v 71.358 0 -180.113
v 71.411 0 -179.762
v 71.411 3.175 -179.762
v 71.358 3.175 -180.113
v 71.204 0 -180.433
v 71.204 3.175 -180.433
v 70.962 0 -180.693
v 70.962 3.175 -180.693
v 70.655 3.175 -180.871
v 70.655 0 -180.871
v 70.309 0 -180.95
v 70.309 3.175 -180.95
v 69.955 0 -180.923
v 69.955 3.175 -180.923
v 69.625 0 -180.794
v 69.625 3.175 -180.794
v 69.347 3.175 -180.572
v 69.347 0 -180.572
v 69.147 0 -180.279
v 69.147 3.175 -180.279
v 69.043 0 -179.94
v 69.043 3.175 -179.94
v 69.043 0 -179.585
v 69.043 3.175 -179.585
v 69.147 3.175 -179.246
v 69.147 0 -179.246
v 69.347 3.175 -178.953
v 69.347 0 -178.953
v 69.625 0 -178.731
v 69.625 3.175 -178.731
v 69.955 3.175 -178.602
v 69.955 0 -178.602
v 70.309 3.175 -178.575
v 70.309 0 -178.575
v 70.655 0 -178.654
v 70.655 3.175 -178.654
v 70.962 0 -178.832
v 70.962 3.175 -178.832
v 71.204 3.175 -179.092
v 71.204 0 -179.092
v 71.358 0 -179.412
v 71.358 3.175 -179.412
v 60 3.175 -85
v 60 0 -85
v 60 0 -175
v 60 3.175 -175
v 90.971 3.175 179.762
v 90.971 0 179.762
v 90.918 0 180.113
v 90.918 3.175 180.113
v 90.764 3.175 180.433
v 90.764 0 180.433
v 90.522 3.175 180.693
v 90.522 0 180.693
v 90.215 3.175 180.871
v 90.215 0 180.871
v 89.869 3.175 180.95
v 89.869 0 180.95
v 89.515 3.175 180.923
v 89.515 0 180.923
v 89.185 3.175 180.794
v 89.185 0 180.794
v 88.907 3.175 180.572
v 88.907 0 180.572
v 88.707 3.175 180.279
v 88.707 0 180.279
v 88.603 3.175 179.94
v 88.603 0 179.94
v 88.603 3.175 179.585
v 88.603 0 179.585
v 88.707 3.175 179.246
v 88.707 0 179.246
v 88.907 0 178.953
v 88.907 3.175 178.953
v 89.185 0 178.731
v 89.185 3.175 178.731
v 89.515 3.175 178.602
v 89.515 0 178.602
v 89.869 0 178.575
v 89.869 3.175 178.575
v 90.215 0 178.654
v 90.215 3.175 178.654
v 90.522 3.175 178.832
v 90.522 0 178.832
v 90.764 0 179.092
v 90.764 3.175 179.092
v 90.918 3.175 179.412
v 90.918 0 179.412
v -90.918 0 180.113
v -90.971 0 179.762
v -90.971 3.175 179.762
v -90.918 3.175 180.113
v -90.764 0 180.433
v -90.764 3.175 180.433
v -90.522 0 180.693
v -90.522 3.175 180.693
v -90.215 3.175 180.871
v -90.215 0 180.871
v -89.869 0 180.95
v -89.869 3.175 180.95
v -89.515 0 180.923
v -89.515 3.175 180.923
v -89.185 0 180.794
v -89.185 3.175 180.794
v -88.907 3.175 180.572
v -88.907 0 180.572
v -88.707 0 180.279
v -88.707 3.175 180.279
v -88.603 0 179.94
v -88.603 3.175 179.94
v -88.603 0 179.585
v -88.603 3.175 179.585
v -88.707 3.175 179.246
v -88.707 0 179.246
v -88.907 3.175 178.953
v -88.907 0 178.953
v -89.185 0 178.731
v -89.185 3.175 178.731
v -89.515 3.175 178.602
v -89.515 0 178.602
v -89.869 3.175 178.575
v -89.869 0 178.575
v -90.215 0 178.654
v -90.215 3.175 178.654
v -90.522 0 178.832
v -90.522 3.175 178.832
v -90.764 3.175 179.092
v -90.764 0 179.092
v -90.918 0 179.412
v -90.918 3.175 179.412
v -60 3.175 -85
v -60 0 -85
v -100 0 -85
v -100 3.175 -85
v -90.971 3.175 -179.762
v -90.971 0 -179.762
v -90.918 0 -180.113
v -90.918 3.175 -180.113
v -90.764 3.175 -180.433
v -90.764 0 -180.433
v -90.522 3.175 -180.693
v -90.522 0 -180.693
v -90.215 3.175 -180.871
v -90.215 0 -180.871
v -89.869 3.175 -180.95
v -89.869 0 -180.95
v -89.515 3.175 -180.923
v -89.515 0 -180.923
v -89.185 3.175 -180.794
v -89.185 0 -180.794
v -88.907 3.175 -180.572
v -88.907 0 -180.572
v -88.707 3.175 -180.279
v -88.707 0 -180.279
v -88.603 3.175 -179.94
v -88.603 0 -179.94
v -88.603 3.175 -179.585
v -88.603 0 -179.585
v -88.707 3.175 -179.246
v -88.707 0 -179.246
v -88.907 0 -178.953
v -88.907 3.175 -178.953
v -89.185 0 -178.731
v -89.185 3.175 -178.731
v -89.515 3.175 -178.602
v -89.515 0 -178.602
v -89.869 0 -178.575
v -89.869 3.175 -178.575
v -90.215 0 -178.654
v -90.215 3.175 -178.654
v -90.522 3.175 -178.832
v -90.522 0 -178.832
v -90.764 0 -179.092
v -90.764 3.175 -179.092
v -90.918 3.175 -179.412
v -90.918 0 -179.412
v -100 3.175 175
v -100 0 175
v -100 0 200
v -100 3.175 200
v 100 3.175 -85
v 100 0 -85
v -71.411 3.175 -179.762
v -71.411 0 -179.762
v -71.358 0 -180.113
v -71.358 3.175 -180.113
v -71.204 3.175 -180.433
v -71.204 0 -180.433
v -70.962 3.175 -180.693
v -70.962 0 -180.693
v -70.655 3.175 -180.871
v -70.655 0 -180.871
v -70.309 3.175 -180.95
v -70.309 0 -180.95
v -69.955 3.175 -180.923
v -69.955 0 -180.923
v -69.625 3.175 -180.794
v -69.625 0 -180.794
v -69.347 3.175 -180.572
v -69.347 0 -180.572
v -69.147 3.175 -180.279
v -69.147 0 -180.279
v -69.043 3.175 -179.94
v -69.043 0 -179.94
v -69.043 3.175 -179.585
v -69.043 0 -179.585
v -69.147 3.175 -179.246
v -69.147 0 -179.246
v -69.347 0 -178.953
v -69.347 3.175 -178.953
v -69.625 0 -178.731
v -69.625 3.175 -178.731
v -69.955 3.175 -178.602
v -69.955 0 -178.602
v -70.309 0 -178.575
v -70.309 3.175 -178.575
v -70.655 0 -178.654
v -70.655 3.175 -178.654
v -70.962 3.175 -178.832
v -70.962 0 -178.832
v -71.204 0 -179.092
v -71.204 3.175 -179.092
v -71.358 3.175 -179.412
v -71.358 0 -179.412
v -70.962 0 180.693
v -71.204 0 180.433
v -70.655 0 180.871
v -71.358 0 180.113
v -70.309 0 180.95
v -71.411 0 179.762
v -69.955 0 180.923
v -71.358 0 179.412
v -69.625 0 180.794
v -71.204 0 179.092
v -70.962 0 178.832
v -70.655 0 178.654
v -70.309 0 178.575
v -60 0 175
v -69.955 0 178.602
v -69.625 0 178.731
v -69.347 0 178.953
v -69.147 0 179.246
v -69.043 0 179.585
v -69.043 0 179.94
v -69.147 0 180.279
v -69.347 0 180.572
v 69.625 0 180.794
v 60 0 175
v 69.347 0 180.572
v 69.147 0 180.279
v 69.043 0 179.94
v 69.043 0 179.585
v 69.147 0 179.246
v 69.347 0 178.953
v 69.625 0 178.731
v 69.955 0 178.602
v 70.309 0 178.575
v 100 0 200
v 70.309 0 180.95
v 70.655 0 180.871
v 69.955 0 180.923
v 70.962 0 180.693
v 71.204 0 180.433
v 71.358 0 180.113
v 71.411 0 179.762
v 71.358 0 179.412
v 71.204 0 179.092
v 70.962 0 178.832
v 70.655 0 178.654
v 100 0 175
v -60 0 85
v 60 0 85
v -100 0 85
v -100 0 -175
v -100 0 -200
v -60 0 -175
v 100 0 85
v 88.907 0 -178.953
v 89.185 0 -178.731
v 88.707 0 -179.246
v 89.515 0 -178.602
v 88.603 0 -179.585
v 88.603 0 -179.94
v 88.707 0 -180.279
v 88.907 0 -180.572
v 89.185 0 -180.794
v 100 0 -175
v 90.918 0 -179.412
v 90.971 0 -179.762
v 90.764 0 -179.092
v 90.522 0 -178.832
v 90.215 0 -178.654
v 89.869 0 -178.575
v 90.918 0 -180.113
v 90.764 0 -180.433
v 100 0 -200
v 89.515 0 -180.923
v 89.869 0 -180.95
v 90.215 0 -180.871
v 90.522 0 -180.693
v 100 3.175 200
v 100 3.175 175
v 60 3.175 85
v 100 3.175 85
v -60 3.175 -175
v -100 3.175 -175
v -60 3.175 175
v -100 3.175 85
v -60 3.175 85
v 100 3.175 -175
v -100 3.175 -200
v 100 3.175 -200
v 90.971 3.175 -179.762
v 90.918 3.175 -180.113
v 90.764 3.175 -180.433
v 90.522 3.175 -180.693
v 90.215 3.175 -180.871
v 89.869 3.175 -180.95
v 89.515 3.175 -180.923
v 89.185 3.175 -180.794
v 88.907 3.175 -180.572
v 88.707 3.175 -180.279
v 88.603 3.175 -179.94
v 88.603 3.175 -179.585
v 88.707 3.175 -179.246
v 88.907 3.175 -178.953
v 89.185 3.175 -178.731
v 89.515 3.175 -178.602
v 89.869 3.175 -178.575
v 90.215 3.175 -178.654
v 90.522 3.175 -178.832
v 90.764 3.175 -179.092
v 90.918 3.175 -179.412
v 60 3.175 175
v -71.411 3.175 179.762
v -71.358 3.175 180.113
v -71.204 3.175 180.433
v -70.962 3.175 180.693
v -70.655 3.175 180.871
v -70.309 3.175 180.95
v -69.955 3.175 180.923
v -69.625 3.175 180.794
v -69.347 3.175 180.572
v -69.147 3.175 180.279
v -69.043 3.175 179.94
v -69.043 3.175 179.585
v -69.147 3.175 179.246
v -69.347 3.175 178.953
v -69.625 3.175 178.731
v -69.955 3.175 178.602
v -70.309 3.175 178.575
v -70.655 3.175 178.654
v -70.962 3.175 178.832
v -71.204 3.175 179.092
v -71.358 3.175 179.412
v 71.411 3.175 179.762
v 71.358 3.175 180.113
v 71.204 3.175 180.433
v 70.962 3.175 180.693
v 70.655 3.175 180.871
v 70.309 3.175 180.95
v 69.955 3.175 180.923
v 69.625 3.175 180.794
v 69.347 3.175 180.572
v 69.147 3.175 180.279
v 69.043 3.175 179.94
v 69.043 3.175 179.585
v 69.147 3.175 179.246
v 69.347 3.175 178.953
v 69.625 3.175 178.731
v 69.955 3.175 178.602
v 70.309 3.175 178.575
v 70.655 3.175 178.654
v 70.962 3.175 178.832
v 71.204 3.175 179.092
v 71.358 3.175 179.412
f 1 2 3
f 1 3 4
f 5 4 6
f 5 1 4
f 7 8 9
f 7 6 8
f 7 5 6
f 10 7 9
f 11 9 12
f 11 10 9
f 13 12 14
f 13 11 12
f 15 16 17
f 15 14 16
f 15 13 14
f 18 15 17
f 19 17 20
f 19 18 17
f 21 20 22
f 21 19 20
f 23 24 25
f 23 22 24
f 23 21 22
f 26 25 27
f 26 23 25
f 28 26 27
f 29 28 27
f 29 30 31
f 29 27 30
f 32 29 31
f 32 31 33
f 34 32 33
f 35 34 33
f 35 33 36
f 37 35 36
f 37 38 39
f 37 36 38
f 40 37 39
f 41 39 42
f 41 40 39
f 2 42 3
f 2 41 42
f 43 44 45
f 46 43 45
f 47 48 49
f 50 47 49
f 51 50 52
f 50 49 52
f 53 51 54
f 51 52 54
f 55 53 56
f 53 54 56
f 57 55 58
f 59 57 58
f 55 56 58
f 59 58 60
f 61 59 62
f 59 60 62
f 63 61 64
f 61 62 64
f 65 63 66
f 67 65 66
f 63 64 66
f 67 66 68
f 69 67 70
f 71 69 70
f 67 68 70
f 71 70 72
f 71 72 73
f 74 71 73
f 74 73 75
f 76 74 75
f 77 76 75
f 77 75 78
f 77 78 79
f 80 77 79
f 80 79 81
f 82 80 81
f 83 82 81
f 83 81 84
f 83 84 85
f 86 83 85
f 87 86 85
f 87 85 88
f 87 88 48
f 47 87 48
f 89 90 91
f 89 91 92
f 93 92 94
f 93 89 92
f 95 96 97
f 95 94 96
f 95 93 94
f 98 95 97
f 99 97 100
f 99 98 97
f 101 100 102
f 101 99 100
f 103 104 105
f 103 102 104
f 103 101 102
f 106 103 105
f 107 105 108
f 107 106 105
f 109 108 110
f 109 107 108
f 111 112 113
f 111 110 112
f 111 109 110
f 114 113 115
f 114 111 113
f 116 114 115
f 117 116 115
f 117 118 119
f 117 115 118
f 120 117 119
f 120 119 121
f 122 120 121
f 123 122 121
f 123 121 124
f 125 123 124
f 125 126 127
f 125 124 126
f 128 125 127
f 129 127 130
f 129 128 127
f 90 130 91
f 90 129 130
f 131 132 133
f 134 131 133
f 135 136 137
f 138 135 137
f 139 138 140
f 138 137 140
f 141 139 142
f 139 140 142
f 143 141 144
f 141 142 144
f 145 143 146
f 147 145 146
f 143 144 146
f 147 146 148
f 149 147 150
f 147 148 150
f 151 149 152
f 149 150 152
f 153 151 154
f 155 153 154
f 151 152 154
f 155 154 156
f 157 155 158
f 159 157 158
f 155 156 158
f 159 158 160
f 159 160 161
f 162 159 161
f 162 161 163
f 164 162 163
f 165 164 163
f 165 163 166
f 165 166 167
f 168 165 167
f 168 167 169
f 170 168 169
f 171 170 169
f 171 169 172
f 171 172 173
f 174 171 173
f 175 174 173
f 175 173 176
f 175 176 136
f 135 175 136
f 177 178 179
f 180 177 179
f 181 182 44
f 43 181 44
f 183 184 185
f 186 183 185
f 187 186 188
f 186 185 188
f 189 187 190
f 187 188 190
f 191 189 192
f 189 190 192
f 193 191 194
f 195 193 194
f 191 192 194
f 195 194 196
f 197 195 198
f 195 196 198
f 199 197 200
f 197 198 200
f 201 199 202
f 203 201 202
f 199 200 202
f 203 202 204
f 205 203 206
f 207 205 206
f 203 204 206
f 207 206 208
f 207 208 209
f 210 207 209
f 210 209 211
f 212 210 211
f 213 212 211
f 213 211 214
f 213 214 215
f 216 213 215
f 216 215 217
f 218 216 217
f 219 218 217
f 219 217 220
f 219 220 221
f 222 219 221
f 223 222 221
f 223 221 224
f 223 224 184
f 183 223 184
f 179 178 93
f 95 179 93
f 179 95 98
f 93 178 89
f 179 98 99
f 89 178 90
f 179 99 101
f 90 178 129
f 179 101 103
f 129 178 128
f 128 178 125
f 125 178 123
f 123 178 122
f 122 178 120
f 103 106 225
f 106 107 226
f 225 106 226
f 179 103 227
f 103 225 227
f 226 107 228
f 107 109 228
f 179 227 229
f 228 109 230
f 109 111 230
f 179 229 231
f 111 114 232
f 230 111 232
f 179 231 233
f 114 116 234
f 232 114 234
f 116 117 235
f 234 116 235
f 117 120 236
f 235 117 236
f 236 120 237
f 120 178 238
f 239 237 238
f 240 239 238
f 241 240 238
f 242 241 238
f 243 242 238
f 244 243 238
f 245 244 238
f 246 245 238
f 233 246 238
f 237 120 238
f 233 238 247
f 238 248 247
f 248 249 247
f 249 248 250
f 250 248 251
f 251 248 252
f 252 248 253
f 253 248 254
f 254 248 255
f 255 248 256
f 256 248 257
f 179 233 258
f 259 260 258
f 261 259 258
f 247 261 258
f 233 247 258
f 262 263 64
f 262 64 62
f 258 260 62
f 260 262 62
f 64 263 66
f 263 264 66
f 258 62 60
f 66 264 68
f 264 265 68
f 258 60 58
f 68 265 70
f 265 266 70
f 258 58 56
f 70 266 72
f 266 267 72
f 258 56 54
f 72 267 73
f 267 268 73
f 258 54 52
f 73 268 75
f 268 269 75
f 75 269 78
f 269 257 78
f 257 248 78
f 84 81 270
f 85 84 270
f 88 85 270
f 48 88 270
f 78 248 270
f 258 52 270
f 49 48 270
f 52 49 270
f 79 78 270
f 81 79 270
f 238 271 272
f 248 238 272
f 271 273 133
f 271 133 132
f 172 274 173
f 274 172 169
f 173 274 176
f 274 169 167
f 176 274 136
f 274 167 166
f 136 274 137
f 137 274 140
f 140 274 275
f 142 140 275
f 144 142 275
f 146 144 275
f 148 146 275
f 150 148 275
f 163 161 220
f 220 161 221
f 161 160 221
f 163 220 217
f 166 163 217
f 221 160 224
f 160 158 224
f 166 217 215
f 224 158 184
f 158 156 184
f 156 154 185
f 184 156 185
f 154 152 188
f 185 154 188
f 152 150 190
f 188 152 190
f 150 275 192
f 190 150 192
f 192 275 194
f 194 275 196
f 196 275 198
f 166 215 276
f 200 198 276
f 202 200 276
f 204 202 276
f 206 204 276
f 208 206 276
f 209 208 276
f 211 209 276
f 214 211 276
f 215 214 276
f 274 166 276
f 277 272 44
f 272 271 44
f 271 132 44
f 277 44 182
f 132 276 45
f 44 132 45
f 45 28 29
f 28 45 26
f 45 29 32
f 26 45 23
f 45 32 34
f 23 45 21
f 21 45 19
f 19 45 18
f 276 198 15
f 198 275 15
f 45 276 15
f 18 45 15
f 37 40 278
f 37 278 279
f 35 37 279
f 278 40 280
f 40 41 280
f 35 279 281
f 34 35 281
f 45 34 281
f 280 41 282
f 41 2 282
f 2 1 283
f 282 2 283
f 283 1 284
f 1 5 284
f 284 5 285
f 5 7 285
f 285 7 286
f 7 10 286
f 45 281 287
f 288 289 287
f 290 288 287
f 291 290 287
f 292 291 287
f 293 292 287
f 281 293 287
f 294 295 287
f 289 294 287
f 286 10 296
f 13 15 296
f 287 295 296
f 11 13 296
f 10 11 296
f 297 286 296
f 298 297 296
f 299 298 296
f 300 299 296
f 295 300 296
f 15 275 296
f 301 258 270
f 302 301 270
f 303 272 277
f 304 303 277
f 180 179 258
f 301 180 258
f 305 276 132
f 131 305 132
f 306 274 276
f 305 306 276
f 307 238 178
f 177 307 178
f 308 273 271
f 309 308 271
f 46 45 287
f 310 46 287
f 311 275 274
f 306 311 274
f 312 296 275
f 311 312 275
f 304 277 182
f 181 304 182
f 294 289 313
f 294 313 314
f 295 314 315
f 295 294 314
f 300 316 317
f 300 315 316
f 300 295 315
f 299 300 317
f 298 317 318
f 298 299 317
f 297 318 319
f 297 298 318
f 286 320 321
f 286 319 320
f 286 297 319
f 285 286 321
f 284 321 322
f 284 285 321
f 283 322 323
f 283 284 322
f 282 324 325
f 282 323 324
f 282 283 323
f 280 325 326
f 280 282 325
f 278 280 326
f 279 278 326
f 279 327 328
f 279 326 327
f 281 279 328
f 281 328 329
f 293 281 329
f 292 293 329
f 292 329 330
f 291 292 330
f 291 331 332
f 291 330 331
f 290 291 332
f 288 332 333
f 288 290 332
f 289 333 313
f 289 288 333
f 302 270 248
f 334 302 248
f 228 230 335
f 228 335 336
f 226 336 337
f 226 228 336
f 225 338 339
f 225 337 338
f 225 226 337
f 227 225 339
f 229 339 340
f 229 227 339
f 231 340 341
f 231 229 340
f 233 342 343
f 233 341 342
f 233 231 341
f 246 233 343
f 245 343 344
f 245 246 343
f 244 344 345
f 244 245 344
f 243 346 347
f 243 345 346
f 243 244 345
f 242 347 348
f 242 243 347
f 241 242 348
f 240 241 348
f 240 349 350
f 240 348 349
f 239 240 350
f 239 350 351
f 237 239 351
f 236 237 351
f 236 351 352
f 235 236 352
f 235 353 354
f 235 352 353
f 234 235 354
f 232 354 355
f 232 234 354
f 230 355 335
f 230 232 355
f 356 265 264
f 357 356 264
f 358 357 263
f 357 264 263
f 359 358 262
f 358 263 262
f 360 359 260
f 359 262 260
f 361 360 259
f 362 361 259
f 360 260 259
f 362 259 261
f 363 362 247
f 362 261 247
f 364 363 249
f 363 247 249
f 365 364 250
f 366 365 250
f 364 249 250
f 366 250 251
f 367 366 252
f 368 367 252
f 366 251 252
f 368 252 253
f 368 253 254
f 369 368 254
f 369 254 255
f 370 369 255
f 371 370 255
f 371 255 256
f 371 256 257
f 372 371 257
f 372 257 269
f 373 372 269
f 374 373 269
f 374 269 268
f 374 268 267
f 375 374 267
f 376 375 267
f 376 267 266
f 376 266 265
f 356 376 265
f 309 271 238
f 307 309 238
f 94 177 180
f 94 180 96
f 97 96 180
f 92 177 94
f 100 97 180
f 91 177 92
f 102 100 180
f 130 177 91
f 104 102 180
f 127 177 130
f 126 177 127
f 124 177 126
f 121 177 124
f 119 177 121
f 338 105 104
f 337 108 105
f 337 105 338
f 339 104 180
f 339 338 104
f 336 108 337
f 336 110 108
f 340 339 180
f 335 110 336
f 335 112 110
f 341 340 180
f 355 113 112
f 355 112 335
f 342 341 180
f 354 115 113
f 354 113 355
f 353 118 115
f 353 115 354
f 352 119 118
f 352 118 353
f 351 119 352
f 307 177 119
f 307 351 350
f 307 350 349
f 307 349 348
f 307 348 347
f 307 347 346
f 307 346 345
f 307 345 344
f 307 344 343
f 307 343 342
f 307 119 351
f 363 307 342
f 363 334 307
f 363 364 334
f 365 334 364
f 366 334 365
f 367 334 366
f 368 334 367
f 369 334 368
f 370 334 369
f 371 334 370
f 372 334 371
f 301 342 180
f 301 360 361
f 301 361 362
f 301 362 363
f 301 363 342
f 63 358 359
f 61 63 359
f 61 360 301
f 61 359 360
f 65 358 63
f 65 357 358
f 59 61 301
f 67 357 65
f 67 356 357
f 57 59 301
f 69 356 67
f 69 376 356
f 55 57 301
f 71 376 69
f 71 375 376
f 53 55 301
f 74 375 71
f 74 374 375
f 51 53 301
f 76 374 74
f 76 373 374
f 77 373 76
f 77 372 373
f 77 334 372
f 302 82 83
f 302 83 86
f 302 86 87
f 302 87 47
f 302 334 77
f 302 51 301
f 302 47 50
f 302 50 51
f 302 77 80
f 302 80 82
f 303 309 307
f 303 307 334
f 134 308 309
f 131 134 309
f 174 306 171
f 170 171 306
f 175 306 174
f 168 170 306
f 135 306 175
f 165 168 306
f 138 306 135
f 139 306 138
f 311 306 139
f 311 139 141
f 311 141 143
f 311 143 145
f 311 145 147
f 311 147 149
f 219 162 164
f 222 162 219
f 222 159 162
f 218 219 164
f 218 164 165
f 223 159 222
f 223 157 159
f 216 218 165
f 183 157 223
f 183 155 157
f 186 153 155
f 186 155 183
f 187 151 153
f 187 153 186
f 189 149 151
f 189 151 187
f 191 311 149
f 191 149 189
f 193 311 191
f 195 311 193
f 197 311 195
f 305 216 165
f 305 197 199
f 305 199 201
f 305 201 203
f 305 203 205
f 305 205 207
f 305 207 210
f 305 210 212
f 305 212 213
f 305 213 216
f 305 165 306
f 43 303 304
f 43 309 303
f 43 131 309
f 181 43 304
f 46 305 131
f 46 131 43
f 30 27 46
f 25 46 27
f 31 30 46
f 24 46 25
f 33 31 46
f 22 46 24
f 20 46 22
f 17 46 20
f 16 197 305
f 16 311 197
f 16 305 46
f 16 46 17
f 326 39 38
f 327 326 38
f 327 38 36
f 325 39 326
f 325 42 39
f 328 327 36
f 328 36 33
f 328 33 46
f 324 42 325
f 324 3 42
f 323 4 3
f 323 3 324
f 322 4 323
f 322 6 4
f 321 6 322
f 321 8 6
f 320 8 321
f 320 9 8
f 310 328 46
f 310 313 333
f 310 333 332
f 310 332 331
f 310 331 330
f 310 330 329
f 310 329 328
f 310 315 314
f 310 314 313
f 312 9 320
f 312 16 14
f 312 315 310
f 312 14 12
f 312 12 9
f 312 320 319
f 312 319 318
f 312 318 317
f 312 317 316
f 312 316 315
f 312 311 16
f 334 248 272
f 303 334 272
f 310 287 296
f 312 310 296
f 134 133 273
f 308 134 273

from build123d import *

# Parameters (mm, degrees)
BOSS_EXTRUDE1_DEPTH                  = 3.175
F_3_32_0_09375_DIAMETER_HOLE1_D      = 2.38125
MIRROR5_AT_THE_SECOND_PLANE_COPY_1_D = 2.38125


with BuildPart() as part:
    # Sketch1 → Boss-Extrude1 (new body)
    with BuildSketch(Plane(origin=(0, 0, 0), x_dir=(1, 0, 0), z_dir=(0, 1, 0))):
        Polygon((-100, 85), (-100, -85), (-60, -85), (-60, -175), (-100, -175), (-100, -200), (100, -200), (100, -175), (60, -175), (60, -85), (100, -85), (100, 85), (60, 85), (60, 175), (100, 175), (100, 200), (-100, 200), (-100, 175), (-60, 175), (-60, 85), align=None)
    extrude(amount=BOSS_EXTRUDE1_DEPTH)

    # 3/32 (0.09375) Diameter Hole1 (through all)
    with Locations(Plane(origin=(0, 3.175, 0), x_dir=(1, 0, 0), z_dir=(0, 1, 0))):
        with Locations((-89.78, 179.7625), (-70.22, 179.7625)):
            f_3_32_0_09375_diameter_hole1 = Hole(F_3_32_0_09375_DIAMETER_HOLE1_D / 2)

    # Mirror5: 3/32 (0.09375) Diameter Hole1 across plane
    add(f_3_32_0_09375_diameter_hole1.mirror(Plane(origin=(0, 0, 0), x_dir=(0, 0, 1), z_dir=(1, 0, 0))), mode=Mode.SUBTRACT)

    # Mirror5 at the second plane: 3/32 (0.09375) Diameter Hole1 across plane
    add(f_3_32_0_09375_diameter_hole1.mirror(Plane.XY), mode=Mode.SUBTRACT)

    # Mirror5 at the second plane copy 1 (through all)
    with Locations(Plane(origin=(0, 3.175, 0), x_dir=(-1, 0, 0), z_dir=(0, 1, 0))):
        with Locations((-89.78, 179.7625), (-70.22, 179.7625)):
            Hole(MIRROR5_AT_THE_SECOND_PLANE_COPY_1_D / 2)


solid = part.part
